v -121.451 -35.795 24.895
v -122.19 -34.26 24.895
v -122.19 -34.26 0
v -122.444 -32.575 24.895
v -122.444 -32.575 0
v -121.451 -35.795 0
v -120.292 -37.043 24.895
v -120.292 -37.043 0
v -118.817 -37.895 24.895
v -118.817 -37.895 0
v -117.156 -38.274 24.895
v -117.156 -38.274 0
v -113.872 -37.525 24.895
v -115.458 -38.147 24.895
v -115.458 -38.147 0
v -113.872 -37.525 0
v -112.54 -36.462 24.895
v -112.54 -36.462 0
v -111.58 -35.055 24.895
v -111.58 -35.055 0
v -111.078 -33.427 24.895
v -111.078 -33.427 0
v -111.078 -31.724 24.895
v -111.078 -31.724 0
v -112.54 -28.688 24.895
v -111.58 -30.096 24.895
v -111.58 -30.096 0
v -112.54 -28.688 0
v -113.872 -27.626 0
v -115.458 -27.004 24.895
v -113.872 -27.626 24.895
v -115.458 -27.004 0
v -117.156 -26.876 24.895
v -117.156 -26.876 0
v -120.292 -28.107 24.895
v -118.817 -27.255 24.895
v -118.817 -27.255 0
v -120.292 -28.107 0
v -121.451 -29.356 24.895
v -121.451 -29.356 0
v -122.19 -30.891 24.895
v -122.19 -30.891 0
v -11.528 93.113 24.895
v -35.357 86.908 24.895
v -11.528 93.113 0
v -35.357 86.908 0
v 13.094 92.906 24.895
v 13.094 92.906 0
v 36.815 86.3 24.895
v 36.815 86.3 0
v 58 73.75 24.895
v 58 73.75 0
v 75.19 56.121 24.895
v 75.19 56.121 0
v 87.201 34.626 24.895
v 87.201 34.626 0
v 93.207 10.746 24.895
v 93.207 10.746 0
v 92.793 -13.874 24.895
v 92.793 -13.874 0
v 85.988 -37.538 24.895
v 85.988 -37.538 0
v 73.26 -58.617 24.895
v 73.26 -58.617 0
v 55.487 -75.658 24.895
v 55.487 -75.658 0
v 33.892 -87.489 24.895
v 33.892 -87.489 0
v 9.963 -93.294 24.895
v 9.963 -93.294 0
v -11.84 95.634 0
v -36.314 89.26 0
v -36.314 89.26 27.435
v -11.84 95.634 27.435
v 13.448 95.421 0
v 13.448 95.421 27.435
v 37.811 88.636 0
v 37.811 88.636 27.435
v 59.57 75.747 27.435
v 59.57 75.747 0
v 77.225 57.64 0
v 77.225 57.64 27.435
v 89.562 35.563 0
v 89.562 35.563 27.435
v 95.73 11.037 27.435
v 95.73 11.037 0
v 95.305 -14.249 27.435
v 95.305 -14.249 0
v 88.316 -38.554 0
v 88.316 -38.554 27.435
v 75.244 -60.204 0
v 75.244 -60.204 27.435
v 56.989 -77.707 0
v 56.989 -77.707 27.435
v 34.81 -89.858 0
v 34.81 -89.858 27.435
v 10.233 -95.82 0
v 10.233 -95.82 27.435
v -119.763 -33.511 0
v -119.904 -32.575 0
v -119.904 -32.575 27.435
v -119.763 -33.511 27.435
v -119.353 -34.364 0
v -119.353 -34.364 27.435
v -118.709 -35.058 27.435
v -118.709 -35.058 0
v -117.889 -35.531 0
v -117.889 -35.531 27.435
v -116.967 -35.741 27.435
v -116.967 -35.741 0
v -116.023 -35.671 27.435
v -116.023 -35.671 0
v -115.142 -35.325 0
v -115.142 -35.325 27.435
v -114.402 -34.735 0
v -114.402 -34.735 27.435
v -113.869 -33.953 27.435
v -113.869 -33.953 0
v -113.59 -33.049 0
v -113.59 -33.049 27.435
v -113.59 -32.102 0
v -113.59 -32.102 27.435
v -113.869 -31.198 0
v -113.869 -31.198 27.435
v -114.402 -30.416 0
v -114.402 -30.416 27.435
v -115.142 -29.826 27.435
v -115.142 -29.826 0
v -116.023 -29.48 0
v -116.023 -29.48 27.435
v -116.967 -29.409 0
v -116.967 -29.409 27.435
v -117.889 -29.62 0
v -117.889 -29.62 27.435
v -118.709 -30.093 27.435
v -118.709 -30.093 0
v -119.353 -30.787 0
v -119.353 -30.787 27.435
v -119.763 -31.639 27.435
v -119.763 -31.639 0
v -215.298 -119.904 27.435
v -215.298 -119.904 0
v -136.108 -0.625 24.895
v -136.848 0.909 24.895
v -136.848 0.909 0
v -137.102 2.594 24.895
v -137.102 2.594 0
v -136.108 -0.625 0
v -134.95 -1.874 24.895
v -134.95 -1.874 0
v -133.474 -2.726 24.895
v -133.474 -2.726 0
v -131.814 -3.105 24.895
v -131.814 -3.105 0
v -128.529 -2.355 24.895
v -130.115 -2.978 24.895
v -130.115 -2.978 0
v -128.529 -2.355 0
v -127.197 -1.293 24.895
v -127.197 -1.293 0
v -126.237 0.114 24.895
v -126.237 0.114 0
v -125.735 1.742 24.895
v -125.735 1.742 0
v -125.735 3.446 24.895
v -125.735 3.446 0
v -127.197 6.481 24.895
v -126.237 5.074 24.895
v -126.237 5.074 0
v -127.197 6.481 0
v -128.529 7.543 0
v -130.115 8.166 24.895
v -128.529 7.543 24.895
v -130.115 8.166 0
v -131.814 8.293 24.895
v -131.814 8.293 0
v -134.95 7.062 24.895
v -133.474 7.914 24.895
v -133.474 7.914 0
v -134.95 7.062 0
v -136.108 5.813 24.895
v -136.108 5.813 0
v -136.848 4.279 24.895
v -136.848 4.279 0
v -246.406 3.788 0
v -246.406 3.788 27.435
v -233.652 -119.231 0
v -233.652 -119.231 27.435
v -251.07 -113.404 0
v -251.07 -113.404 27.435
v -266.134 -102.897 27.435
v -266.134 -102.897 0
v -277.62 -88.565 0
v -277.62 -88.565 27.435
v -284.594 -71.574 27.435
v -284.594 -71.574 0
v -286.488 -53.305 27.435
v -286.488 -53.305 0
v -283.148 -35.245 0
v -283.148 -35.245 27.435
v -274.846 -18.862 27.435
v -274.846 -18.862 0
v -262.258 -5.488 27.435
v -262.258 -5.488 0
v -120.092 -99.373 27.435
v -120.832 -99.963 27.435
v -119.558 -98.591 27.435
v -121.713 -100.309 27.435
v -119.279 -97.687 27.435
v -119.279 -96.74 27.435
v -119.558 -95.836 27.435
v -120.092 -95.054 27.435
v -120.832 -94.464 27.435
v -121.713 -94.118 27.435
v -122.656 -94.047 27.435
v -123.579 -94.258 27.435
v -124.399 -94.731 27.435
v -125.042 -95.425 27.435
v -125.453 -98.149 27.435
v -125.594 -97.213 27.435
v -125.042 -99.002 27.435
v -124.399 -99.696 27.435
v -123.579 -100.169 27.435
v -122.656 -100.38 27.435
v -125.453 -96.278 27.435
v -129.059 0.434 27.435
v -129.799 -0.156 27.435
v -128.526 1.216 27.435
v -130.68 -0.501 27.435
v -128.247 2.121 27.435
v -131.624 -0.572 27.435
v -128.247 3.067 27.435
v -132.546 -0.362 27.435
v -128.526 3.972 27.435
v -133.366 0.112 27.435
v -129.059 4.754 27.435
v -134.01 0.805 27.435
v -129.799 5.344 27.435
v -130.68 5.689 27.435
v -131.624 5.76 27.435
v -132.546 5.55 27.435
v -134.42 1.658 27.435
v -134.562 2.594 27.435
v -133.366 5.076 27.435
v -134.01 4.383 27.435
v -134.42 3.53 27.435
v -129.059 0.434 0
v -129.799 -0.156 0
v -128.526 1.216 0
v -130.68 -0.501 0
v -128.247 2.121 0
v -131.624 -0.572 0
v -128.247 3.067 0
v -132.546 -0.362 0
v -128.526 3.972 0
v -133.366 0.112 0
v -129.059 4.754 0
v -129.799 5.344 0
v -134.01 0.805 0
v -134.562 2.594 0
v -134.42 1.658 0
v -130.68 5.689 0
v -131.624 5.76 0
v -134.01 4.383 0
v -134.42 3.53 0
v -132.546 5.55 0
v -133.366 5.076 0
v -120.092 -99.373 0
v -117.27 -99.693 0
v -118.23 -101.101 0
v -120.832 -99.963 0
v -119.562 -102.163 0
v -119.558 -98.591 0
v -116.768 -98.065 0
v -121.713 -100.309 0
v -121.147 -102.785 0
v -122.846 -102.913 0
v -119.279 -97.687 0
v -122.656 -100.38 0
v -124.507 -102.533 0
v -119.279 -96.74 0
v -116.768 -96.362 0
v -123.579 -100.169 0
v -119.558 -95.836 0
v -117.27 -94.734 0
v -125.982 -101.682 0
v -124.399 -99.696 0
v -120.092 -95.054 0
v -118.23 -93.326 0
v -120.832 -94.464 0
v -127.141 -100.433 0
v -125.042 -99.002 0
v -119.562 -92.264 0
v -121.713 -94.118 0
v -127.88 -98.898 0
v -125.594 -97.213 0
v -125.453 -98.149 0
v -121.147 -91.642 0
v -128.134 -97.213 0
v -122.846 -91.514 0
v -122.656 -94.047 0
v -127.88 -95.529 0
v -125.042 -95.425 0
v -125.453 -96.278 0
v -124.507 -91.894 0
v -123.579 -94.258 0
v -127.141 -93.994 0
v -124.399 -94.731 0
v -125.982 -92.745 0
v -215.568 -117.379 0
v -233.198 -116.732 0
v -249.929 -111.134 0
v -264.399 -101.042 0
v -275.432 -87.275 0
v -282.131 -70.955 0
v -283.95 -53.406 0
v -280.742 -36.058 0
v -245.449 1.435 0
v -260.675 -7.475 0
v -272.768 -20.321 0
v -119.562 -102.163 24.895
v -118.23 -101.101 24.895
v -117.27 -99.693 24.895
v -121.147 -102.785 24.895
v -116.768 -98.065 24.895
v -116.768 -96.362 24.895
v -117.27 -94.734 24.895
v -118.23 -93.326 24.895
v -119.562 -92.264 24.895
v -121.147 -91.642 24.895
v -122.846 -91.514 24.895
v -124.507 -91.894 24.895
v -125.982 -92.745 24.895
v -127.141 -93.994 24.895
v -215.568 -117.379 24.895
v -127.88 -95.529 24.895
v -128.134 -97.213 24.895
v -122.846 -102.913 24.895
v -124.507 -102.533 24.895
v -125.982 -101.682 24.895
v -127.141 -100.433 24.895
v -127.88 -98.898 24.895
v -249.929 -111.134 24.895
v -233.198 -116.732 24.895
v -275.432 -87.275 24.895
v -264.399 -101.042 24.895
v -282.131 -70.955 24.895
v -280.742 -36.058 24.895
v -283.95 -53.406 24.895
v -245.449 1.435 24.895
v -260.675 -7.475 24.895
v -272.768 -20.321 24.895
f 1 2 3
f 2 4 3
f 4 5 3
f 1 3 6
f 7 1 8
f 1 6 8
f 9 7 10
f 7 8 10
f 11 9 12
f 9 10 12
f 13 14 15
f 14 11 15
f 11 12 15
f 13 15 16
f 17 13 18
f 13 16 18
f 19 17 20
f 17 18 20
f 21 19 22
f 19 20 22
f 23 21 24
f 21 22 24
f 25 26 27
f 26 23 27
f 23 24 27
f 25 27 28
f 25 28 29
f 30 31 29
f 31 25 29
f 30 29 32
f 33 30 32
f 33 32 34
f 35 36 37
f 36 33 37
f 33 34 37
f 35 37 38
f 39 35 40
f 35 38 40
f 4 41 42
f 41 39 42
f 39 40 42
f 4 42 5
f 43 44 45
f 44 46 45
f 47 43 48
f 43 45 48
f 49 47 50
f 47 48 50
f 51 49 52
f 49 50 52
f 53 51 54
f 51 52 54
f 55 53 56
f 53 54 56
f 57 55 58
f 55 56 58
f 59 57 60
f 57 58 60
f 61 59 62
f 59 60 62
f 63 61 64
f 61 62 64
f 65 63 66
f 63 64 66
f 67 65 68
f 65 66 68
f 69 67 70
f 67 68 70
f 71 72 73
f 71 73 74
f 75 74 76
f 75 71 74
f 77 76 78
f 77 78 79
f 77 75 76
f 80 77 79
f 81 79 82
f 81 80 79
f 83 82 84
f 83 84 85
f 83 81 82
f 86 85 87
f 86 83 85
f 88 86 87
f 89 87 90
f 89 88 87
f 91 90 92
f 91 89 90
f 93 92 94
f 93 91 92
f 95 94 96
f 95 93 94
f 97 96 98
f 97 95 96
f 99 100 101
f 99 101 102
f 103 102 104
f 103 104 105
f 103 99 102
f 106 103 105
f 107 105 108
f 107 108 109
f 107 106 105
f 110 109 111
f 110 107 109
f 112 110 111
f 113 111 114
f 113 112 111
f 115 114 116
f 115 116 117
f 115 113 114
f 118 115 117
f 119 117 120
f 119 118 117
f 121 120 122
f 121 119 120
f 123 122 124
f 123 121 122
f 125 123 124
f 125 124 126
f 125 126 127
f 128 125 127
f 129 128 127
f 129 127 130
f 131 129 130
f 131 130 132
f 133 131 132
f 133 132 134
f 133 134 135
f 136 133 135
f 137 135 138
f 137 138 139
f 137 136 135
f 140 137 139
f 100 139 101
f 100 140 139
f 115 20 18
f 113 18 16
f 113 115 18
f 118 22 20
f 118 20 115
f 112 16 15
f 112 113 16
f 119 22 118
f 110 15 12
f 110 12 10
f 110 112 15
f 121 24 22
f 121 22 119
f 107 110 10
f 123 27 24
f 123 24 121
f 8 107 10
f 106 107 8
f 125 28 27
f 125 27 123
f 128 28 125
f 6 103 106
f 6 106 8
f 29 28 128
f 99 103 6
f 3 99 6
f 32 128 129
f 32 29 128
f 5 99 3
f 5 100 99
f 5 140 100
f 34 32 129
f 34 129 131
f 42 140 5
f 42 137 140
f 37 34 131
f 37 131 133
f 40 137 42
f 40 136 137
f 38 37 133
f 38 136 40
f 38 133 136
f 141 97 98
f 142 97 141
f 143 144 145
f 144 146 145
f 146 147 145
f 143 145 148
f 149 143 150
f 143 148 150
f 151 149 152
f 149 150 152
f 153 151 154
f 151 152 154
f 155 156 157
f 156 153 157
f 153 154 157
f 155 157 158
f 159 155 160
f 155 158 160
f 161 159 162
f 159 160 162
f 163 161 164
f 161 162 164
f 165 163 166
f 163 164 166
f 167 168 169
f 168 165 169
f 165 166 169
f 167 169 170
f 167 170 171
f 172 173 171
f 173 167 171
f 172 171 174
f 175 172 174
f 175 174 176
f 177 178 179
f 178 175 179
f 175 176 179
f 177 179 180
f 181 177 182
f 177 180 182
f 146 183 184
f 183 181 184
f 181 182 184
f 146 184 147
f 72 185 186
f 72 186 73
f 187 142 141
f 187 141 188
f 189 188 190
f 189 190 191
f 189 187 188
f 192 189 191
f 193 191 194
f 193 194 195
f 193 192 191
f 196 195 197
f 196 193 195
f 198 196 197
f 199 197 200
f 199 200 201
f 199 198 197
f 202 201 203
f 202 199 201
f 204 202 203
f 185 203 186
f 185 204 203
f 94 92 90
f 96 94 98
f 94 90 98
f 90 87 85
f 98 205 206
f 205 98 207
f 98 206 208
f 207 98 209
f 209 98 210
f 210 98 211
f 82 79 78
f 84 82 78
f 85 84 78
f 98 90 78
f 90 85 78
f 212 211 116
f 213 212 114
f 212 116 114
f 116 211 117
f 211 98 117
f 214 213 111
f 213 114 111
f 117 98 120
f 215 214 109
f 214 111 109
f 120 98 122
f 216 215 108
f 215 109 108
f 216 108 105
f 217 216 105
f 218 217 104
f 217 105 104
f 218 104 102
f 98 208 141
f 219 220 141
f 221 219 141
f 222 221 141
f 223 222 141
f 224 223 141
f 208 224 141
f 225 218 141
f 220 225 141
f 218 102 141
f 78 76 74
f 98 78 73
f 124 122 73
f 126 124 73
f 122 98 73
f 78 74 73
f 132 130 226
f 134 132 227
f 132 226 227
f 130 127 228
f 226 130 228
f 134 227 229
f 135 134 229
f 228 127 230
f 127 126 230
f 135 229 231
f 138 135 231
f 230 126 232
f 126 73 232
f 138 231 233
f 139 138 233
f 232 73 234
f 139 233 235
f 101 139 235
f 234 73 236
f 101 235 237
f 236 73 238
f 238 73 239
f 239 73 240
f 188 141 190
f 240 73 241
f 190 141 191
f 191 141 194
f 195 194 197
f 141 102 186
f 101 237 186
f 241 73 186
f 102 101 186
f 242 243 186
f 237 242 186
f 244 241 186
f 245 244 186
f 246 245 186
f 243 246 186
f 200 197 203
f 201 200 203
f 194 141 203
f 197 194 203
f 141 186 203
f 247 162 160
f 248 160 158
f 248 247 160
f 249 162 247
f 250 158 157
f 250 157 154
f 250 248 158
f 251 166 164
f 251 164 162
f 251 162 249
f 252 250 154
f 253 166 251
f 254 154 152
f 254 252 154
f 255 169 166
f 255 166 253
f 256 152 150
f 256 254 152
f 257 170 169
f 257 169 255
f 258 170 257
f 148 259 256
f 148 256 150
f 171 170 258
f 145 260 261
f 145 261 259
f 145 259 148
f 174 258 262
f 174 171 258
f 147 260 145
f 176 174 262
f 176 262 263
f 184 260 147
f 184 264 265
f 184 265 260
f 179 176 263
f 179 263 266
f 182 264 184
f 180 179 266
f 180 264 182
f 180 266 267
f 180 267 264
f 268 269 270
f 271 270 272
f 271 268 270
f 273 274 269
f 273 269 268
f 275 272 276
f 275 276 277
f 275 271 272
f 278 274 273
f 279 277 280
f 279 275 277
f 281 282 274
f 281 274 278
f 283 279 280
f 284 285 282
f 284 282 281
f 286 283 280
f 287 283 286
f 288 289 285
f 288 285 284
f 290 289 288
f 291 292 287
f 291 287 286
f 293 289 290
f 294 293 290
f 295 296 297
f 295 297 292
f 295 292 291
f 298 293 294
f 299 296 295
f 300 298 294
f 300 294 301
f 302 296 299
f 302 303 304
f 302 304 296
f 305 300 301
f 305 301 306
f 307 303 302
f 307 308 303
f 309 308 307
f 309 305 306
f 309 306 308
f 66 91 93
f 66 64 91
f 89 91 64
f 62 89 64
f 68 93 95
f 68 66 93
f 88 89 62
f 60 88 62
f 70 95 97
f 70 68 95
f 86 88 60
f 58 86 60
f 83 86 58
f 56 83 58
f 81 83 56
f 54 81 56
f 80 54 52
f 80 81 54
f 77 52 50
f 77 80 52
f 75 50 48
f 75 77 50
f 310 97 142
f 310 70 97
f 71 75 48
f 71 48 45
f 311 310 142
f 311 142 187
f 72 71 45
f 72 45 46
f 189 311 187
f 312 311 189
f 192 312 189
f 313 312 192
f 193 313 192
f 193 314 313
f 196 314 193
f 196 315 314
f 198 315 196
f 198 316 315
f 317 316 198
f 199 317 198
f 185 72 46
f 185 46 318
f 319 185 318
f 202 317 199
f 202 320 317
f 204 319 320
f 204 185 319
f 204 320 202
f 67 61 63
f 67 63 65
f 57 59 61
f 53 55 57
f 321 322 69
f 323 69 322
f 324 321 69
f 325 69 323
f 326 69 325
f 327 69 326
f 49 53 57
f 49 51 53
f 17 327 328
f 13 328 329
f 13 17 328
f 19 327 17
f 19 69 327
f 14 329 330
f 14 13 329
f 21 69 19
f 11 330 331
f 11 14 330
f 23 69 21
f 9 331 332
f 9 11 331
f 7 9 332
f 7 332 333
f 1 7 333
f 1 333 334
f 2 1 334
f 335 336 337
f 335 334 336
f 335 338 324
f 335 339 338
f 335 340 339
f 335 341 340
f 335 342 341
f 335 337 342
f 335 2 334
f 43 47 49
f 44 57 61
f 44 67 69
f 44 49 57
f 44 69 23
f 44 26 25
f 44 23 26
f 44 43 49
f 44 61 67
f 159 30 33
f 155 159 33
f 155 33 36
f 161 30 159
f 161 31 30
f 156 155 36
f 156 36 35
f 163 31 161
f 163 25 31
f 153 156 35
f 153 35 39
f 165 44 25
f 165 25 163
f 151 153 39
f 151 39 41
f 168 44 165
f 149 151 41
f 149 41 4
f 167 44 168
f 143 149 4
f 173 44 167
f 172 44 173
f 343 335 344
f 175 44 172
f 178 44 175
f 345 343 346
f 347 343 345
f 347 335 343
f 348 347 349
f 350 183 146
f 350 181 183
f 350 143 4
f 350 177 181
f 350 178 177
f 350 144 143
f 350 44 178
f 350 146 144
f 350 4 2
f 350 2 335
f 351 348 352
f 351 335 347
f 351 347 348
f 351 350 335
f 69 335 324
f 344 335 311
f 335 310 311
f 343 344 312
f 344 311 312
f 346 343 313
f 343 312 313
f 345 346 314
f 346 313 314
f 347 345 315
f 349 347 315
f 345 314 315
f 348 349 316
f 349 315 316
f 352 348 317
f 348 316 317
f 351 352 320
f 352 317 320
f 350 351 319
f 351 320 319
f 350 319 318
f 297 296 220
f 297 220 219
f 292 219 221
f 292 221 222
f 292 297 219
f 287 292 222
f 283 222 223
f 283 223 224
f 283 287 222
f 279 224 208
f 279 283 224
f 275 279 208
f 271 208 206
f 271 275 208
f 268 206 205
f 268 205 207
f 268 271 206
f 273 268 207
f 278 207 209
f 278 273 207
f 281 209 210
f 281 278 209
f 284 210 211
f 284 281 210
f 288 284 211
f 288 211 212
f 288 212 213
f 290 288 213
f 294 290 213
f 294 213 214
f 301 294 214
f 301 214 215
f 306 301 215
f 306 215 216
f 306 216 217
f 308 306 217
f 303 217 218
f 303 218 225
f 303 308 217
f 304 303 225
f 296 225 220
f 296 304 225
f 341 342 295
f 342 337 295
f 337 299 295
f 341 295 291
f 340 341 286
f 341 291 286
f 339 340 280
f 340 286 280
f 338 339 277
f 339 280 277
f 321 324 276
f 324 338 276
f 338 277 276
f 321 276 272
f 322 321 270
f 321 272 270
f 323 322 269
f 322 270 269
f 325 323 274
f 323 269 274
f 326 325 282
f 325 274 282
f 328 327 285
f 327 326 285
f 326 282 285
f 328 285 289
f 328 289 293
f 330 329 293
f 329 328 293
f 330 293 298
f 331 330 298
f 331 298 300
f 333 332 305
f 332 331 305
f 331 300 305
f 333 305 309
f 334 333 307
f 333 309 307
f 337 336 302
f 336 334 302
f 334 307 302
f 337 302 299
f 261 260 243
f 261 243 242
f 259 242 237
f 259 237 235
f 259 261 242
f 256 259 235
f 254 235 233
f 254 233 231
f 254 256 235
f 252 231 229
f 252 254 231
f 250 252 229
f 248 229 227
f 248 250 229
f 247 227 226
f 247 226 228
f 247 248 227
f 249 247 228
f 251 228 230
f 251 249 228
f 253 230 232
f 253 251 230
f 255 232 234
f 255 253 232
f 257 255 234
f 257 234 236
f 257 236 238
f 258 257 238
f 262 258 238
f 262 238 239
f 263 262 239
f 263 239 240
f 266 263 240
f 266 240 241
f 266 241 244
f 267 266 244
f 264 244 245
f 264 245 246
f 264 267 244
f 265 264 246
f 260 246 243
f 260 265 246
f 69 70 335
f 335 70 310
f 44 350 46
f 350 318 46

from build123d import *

# Parameters (mm, degrees)
SKETCH1_R           = 3.175
BOSS_EXTRUDE1_DEPTH = 27.435
SHELL1_T            = -2.54


with BuildPart() as part:
    # Sketch1 → Boss-Extrude1 (new body)
    with BuildSketch(Plane.XY):
        with BuildLine():
            Line((-246.406013588, 3.788089061), (-36.31395184, 89.260287536))
            ThreePointArc((-36.31395184, 89.260287536), (93.454251213, 23.503296779), (10.232750038, -95.819584929))
            Line((10.232750038, -95.819584929), (-215.29793902, -119.904422791))
            ThreePointArc((-215.29793902, -119.904422791), (-284.593997313, -71.574027866), (-246.406013588, 3.788089061))
        make_face()
        with Locations(Location((-131.38650471, 2.593989183, 0), (0, 0, 180))):
            Circle(SKETCH1_R, mode=Mode.SUBTRACT)
        with Locations(Location((-116.729233004, -32.575302177, 0), (0, 0, 180))):
            Circle(SKETCH1_R, mode=Mode.SUBTRACT)
        with Locations(Location((-122.41902156, -97.213498796, 0), (0, 0, 180))):
            Circle(SKETCH1_R, mode=Mode.SUBTRACT)
    extrude(amount=BOSS_EXTRUDE1_DEPTH)

    # Shell1
    shell1_openings = [part.faces().sort_by_distance(p)[0] for p in [
        (-83.986643927, -21.103730923, 0),
    ]]
    offset(amount=SHELL1_T, openings=shell1_openings, kind=Kind.INTERSECTION)


solid = part.part
